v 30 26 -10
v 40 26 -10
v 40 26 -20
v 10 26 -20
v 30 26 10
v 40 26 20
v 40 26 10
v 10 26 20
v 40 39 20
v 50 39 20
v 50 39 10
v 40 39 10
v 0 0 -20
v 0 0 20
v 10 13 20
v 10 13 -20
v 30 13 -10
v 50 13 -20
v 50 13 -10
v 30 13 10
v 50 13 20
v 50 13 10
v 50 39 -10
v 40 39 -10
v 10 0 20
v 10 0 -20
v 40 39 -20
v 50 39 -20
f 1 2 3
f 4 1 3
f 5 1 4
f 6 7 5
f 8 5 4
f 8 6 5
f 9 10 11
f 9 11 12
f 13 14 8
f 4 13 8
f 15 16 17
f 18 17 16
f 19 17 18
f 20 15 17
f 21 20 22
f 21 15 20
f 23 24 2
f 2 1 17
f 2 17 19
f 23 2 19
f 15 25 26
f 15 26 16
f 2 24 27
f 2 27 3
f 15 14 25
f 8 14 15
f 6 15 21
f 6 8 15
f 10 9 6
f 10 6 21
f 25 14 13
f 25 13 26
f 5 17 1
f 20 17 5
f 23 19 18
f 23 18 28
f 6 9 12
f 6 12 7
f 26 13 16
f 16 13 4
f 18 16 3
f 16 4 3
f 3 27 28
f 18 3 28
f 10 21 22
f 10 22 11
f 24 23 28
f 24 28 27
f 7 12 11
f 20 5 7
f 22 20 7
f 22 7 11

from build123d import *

# Parameters (mm, degrees)
F1_DEPTH = 20
F2_W     = 20
F2_H     = 20
F3_DEPTH = 26.001
F5_DEPTH = 40.001


with BuildPart() as f1:
    # F0 (on Top) → F1 (new body, symmetric)
    with BuildSketch(Plane.XY):
        Polygon((0, 26), (0, 0), (10, 0), (10, 13), (50, 13), (50, 39), (40, 39), (40, 26), align=None)
    extrude(amount=F1_DEPTH, both=True)

    # F2 (on face) → F3 (cut, through all)
    with BuildSketch(Plane.XZ.offset(-13)):
        with Locations((40, 0)):
            Rectangle(F2_W, F2_H)
    extrude(amount=-F3_DEPTH, mode=Mode.SUBTRACT)

    # F4 (on face) → F5 (cut, through all)
    with BuildSketch(Plane.XY.offset(20)):
        Polygon((0, 0), (10, 26), (0, 26), align=None)
    extrude(amount=-F5_DEPTH, mode=Mode.SUBTRACT)


solid = f1.part
